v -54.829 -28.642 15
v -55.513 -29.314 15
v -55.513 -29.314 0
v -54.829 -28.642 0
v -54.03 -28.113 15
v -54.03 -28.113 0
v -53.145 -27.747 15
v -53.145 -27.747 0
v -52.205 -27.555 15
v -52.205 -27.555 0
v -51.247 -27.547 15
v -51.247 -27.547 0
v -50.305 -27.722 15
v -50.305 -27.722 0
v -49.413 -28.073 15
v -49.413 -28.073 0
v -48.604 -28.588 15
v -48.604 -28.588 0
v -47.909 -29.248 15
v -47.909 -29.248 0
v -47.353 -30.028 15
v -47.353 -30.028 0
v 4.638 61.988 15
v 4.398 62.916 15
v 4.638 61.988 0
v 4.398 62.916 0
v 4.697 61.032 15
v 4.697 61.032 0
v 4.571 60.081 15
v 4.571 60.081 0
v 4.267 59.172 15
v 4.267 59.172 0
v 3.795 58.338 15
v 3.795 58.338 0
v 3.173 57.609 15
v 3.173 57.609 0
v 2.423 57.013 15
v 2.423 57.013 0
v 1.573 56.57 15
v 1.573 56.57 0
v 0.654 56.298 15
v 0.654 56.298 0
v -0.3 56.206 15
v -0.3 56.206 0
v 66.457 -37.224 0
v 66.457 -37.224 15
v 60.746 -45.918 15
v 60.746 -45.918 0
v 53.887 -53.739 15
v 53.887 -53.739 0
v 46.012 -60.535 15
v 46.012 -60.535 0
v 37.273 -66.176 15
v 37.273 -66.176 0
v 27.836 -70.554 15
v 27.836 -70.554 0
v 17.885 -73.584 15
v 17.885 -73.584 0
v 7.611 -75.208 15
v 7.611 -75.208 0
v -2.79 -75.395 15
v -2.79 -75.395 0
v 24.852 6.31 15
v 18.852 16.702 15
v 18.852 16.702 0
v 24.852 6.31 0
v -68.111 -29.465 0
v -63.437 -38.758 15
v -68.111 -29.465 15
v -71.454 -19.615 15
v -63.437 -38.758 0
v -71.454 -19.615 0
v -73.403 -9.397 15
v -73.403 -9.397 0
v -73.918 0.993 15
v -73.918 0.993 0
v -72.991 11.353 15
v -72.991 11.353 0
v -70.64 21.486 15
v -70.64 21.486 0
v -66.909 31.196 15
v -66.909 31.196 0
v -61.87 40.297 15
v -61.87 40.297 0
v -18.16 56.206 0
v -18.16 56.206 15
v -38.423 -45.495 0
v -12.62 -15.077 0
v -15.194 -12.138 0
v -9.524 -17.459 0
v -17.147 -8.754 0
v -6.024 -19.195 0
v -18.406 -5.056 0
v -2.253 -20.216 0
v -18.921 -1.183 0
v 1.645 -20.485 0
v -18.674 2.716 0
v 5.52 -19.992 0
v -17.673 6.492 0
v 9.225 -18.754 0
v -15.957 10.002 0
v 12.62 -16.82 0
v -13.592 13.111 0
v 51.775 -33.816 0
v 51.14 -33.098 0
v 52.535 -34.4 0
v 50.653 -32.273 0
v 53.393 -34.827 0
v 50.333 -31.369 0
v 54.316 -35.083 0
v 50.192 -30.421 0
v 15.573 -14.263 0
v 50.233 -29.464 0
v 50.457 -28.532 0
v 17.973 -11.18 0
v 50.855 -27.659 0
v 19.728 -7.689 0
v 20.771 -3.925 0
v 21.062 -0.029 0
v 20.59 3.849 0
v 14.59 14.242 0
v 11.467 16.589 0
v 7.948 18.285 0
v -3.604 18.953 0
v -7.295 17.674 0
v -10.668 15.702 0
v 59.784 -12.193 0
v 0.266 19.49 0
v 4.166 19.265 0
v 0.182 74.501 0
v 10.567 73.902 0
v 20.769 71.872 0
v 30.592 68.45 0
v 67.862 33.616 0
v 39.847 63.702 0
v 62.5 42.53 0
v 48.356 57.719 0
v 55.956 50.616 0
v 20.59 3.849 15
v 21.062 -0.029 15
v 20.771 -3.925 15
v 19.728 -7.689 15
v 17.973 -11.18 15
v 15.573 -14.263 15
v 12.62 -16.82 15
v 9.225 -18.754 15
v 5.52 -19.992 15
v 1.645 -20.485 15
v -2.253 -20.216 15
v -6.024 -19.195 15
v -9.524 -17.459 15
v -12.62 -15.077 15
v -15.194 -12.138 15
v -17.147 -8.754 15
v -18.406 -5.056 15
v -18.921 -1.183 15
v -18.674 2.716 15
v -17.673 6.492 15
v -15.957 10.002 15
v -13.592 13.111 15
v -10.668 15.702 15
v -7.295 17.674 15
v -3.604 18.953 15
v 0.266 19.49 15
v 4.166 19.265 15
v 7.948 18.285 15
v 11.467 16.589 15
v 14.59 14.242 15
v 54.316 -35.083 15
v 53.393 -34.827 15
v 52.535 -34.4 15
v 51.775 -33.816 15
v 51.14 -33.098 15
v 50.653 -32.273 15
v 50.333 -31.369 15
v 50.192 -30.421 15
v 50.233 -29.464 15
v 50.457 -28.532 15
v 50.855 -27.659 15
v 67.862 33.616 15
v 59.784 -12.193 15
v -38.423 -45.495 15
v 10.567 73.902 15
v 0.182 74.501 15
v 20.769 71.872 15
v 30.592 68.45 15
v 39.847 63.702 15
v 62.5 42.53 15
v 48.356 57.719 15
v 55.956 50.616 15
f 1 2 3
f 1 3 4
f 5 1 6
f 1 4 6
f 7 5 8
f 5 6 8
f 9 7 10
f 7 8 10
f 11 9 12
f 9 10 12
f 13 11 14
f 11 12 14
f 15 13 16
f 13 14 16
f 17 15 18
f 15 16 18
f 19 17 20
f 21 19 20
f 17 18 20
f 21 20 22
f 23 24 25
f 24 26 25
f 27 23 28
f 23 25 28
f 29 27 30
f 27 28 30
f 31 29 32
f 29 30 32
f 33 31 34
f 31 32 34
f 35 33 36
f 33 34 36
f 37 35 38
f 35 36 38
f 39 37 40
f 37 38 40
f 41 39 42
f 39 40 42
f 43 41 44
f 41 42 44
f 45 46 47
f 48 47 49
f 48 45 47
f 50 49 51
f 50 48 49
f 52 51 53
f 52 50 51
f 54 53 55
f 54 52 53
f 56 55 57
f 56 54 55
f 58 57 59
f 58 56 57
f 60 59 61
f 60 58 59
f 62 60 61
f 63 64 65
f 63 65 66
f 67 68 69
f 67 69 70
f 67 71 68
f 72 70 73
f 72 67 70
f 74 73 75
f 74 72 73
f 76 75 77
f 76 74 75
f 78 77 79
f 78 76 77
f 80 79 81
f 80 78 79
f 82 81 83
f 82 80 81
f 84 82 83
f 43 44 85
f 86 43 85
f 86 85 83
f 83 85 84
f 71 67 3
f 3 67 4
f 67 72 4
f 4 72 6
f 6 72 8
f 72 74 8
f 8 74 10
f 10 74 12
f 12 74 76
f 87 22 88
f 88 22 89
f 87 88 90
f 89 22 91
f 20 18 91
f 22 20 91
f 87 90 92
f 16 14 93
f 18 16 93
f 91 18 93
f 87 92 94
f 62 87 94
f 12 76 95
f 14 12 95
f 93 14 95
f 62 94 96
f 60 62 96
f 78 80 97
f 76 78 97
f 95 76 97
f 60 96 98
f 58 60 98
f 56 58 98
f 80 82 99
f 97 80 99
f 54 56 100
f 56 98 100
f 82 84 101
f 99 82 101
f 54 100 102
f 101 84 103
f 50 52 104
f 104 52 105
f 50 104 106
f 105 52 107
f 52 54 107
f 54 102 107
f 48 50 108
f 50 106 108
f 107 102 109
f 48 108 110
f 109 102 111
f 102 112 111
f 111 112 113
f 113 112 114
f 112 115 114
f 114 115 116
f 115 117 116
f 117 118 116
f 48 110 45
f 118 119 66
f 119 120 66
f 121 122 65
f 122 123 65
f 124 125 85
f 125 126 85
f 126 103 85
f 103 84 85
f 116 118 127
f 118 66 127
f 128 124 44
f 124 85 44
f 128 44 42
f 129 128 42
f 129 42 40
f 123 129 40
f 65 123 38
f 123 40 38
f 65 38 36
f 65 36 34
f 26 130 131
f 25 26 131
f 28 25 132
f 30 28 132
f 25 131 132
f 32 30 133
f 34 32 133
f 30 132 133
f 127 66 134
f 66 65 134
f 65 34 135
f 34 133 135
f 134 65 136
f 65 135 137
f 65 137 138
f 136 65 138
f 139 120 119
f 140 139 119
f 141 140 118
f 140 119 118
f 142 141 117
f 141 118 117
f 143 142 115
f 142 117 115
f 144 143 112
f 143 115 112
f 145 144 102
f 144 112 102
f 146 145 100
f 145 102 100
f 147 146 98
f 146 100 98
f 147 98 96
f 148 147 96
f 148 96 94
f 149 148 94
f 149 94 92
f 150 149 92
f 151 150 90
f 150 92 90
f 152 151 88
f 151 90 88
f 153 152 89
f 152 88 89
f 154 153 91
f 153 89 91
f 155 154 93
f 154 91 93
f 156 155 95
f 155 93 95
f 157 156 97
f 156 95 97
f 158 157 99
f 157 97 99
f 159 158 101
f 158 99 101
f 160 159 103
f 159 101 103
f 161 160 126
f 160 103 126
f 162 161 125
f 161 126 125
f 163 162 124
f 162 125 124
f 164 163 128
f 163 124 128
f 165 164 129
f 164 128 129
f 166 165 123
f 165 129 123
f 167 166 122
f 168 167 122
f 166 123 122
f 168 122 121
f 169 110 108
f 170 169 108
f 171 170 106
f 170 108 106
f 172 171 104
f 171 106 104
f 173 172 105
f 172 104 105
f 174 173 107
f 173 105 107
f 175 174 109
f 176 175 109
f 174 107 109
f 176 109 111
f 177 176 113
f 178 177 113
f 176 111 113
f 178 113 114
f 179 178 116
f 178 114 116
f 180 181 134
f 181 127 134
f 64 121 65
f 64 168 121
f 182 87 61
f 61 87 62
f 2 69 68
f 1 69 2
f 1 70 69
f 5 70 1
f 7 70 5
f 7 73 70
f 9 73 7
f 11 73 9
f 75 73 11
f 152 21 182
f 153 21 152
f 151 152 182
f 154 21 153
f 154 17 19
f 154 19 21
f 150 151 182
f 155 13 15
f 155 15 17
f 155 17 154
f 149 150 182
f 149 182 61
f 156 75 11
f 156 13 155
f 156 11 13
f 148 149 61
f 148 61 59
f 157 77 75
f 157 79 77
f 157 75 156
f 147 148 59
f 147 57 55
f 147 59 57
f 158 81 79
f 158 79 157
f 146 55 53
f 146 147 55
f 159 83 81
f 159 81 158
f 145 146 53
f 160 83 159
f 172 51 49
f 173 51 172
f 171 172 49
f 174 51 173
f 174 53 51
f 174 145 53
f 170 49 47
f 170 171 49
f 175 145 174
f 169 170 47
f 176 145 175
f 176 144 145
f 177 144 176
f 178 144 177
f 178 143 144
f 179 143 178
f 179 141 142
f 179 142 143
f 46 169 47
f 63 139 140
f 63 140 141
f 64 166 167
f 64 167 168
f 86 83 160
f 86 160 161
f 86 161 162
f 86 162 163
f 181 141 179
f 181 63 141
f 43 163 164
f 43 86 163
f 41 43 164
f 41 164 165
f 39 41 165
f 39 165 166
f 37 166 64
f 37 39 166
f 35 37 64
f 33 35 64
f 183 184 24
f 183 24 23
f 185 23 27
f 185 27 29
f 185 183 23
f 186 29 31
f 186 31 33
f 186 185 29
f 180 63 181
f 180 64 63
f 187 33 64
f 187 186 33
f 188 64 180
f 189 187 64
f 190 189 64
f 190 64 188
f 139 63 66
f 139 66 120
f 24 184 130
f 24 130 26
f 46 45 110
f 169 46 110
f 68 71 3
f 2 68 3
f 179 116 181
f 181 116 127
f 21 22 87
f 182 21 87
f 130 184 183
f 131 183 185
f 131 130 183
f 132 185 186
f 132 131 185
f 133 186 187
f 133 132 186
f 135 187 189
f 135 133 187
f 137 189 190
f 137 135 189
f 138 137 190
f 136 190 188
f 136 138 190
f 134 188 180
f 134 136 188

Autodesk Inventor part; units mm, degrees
ref_plane "YZ Plane" through (0, 0, 0) normal (1, 0, 0) x (0, 1, 0)
ref_plane "XZ Plane" through (0, 0, 0) normal (0, 1, 0) x (-1, 0, 0)
ref_plane "XY Plane" through (0, 0, 0) normal (0, 0, 1) x (1, 0, 0)
sketch "Sketch1" plane through (0, 0, 0) normal (0, 0, 1) x (1, 0, 0)
  line L0 (-74.9186, 47.1822) -> (53.4099, 57.2393) construction
  line L1 (53.4099, 57.2393) -> (63.1167, -66.6187) construction
  line L2 (63.1167, -66.6187) -> (-65.2118, -76.6758) construction
  line L3 (-65.2118, -76.6758) -> (-74.9186, 47.1822) construction
  line L4 (6, 16) -> (-6, 24) construction
  line L5 (0, 20) -> (6, 24) construction
  circle A0 centre (1.0672, -0.4938) radius 75
  line L6 (1.0672, 74.5062) -> (1.0672, -0.4938) construction
  line L7 (1.0672, 74.5062) -> (5.6579, 61.8933)
  line L8 (1.0672, 74.5062) -> (14.4896, 74.5062) construction
  line L9 (1.3501, 55.1985) -> (-17.016, 53.7591)
  line L10 (-17.016, 53.7591) -> (-67, 31)
  arc A1 (1.3501, 55.1985) -> (5.6579, 61.8933) centre (0.9595, 60.1832) ccw
  circle A2 centre (1.0672, -0.4938) radius 20
  point P0 (0, 0)
  point P1 (7.9076, 55.7124)
  dimension "d2" = 12
  dimension "d4" = 150
  dimension "d5" = 20
  dimension "d6" = 70
  dimension "d8" = 25
  dimension "d10" = 160
  dimension "d11" = 5
  dimension "d23" = 40
ref_plane "Work Plane1" through (0, 0, 0) normal (0, 0, -1) x (-1, 0, 0)
sketch "Sketch2" plane through (0, 0, 0) normal (0, 0, -1) x (-1, 0, 0)
  line L0 (0, 75) -> (-4.3981, 62.9162) projected
  arc A0 (-4.3981, 62.9162) -> (0.3003, 56.2061) centre (0.3003, 61.2061) ccw projected
  line L1 (0.3003, 56.2061) -> (18.1596, 56.2061) projected
  line L2 (18.1596, 56.2061) -> (63.6666, 39.643) projected
  arc A1 (63.6666, 39.643) -> (0, 75) centre (27.2068, 48.9906) ccw
  point P0 (0, 0)
extrude "Extrusion3" add sketch "Sketch1" along normal blind 15
extrude "Extrusion4" cut sketch "Sketch2" against normal blind 15
pattern_circular "Circular Pattern2" count 3 over 360 about axis through (1.0672, -0.4938, 0) along (0, 0, 1) of "Extrusion4"
sketch "Sketch3" plane through (0, 0, 0) normal (0, 0, -1) x (-1, 0, 0)
  circle A0 centre (-1.0672, -0.4938) radius 20 projected
  point P0 (0, 0)
sketch "Sketch4" plane through (0, 0, 15) normal (0, 0, 1) x (1, 0, 0)
  circle A0 centre (1.0672, -0.4938) radius 20 projected
  line L0 (17.9236, 2.3101) -> (11.9236, 12.7024)
  line L1 (11.9236, 12.7024) -> (18.8518, 16.7024)
  line L2 (18.8518, 16.7024) -> (24.8518, 6.3101)
  line L3 (24.8518, 6.3101) -> (17.9236, 2.3101)
  line L4 (17.9236, 2.3101) -> (18.8518, 16.7024) construction
  line L5 (11.9236, 12.7024) -> (24.8518, 6.3101) construction
  point P0 (0, 0)
  point P1 (18.3877, 9.5062)
  dimension "d35" = 12
  dimension "d36" = 8
extrude "Extrusion5" cut sketch "Sketch4" against normal through all contours L3 L0 L1 A0 | A0 L1 L2 L3 picked at (15.7106, 8.7411)
properties part number "pisau ok2" material "Stainless Steel"
